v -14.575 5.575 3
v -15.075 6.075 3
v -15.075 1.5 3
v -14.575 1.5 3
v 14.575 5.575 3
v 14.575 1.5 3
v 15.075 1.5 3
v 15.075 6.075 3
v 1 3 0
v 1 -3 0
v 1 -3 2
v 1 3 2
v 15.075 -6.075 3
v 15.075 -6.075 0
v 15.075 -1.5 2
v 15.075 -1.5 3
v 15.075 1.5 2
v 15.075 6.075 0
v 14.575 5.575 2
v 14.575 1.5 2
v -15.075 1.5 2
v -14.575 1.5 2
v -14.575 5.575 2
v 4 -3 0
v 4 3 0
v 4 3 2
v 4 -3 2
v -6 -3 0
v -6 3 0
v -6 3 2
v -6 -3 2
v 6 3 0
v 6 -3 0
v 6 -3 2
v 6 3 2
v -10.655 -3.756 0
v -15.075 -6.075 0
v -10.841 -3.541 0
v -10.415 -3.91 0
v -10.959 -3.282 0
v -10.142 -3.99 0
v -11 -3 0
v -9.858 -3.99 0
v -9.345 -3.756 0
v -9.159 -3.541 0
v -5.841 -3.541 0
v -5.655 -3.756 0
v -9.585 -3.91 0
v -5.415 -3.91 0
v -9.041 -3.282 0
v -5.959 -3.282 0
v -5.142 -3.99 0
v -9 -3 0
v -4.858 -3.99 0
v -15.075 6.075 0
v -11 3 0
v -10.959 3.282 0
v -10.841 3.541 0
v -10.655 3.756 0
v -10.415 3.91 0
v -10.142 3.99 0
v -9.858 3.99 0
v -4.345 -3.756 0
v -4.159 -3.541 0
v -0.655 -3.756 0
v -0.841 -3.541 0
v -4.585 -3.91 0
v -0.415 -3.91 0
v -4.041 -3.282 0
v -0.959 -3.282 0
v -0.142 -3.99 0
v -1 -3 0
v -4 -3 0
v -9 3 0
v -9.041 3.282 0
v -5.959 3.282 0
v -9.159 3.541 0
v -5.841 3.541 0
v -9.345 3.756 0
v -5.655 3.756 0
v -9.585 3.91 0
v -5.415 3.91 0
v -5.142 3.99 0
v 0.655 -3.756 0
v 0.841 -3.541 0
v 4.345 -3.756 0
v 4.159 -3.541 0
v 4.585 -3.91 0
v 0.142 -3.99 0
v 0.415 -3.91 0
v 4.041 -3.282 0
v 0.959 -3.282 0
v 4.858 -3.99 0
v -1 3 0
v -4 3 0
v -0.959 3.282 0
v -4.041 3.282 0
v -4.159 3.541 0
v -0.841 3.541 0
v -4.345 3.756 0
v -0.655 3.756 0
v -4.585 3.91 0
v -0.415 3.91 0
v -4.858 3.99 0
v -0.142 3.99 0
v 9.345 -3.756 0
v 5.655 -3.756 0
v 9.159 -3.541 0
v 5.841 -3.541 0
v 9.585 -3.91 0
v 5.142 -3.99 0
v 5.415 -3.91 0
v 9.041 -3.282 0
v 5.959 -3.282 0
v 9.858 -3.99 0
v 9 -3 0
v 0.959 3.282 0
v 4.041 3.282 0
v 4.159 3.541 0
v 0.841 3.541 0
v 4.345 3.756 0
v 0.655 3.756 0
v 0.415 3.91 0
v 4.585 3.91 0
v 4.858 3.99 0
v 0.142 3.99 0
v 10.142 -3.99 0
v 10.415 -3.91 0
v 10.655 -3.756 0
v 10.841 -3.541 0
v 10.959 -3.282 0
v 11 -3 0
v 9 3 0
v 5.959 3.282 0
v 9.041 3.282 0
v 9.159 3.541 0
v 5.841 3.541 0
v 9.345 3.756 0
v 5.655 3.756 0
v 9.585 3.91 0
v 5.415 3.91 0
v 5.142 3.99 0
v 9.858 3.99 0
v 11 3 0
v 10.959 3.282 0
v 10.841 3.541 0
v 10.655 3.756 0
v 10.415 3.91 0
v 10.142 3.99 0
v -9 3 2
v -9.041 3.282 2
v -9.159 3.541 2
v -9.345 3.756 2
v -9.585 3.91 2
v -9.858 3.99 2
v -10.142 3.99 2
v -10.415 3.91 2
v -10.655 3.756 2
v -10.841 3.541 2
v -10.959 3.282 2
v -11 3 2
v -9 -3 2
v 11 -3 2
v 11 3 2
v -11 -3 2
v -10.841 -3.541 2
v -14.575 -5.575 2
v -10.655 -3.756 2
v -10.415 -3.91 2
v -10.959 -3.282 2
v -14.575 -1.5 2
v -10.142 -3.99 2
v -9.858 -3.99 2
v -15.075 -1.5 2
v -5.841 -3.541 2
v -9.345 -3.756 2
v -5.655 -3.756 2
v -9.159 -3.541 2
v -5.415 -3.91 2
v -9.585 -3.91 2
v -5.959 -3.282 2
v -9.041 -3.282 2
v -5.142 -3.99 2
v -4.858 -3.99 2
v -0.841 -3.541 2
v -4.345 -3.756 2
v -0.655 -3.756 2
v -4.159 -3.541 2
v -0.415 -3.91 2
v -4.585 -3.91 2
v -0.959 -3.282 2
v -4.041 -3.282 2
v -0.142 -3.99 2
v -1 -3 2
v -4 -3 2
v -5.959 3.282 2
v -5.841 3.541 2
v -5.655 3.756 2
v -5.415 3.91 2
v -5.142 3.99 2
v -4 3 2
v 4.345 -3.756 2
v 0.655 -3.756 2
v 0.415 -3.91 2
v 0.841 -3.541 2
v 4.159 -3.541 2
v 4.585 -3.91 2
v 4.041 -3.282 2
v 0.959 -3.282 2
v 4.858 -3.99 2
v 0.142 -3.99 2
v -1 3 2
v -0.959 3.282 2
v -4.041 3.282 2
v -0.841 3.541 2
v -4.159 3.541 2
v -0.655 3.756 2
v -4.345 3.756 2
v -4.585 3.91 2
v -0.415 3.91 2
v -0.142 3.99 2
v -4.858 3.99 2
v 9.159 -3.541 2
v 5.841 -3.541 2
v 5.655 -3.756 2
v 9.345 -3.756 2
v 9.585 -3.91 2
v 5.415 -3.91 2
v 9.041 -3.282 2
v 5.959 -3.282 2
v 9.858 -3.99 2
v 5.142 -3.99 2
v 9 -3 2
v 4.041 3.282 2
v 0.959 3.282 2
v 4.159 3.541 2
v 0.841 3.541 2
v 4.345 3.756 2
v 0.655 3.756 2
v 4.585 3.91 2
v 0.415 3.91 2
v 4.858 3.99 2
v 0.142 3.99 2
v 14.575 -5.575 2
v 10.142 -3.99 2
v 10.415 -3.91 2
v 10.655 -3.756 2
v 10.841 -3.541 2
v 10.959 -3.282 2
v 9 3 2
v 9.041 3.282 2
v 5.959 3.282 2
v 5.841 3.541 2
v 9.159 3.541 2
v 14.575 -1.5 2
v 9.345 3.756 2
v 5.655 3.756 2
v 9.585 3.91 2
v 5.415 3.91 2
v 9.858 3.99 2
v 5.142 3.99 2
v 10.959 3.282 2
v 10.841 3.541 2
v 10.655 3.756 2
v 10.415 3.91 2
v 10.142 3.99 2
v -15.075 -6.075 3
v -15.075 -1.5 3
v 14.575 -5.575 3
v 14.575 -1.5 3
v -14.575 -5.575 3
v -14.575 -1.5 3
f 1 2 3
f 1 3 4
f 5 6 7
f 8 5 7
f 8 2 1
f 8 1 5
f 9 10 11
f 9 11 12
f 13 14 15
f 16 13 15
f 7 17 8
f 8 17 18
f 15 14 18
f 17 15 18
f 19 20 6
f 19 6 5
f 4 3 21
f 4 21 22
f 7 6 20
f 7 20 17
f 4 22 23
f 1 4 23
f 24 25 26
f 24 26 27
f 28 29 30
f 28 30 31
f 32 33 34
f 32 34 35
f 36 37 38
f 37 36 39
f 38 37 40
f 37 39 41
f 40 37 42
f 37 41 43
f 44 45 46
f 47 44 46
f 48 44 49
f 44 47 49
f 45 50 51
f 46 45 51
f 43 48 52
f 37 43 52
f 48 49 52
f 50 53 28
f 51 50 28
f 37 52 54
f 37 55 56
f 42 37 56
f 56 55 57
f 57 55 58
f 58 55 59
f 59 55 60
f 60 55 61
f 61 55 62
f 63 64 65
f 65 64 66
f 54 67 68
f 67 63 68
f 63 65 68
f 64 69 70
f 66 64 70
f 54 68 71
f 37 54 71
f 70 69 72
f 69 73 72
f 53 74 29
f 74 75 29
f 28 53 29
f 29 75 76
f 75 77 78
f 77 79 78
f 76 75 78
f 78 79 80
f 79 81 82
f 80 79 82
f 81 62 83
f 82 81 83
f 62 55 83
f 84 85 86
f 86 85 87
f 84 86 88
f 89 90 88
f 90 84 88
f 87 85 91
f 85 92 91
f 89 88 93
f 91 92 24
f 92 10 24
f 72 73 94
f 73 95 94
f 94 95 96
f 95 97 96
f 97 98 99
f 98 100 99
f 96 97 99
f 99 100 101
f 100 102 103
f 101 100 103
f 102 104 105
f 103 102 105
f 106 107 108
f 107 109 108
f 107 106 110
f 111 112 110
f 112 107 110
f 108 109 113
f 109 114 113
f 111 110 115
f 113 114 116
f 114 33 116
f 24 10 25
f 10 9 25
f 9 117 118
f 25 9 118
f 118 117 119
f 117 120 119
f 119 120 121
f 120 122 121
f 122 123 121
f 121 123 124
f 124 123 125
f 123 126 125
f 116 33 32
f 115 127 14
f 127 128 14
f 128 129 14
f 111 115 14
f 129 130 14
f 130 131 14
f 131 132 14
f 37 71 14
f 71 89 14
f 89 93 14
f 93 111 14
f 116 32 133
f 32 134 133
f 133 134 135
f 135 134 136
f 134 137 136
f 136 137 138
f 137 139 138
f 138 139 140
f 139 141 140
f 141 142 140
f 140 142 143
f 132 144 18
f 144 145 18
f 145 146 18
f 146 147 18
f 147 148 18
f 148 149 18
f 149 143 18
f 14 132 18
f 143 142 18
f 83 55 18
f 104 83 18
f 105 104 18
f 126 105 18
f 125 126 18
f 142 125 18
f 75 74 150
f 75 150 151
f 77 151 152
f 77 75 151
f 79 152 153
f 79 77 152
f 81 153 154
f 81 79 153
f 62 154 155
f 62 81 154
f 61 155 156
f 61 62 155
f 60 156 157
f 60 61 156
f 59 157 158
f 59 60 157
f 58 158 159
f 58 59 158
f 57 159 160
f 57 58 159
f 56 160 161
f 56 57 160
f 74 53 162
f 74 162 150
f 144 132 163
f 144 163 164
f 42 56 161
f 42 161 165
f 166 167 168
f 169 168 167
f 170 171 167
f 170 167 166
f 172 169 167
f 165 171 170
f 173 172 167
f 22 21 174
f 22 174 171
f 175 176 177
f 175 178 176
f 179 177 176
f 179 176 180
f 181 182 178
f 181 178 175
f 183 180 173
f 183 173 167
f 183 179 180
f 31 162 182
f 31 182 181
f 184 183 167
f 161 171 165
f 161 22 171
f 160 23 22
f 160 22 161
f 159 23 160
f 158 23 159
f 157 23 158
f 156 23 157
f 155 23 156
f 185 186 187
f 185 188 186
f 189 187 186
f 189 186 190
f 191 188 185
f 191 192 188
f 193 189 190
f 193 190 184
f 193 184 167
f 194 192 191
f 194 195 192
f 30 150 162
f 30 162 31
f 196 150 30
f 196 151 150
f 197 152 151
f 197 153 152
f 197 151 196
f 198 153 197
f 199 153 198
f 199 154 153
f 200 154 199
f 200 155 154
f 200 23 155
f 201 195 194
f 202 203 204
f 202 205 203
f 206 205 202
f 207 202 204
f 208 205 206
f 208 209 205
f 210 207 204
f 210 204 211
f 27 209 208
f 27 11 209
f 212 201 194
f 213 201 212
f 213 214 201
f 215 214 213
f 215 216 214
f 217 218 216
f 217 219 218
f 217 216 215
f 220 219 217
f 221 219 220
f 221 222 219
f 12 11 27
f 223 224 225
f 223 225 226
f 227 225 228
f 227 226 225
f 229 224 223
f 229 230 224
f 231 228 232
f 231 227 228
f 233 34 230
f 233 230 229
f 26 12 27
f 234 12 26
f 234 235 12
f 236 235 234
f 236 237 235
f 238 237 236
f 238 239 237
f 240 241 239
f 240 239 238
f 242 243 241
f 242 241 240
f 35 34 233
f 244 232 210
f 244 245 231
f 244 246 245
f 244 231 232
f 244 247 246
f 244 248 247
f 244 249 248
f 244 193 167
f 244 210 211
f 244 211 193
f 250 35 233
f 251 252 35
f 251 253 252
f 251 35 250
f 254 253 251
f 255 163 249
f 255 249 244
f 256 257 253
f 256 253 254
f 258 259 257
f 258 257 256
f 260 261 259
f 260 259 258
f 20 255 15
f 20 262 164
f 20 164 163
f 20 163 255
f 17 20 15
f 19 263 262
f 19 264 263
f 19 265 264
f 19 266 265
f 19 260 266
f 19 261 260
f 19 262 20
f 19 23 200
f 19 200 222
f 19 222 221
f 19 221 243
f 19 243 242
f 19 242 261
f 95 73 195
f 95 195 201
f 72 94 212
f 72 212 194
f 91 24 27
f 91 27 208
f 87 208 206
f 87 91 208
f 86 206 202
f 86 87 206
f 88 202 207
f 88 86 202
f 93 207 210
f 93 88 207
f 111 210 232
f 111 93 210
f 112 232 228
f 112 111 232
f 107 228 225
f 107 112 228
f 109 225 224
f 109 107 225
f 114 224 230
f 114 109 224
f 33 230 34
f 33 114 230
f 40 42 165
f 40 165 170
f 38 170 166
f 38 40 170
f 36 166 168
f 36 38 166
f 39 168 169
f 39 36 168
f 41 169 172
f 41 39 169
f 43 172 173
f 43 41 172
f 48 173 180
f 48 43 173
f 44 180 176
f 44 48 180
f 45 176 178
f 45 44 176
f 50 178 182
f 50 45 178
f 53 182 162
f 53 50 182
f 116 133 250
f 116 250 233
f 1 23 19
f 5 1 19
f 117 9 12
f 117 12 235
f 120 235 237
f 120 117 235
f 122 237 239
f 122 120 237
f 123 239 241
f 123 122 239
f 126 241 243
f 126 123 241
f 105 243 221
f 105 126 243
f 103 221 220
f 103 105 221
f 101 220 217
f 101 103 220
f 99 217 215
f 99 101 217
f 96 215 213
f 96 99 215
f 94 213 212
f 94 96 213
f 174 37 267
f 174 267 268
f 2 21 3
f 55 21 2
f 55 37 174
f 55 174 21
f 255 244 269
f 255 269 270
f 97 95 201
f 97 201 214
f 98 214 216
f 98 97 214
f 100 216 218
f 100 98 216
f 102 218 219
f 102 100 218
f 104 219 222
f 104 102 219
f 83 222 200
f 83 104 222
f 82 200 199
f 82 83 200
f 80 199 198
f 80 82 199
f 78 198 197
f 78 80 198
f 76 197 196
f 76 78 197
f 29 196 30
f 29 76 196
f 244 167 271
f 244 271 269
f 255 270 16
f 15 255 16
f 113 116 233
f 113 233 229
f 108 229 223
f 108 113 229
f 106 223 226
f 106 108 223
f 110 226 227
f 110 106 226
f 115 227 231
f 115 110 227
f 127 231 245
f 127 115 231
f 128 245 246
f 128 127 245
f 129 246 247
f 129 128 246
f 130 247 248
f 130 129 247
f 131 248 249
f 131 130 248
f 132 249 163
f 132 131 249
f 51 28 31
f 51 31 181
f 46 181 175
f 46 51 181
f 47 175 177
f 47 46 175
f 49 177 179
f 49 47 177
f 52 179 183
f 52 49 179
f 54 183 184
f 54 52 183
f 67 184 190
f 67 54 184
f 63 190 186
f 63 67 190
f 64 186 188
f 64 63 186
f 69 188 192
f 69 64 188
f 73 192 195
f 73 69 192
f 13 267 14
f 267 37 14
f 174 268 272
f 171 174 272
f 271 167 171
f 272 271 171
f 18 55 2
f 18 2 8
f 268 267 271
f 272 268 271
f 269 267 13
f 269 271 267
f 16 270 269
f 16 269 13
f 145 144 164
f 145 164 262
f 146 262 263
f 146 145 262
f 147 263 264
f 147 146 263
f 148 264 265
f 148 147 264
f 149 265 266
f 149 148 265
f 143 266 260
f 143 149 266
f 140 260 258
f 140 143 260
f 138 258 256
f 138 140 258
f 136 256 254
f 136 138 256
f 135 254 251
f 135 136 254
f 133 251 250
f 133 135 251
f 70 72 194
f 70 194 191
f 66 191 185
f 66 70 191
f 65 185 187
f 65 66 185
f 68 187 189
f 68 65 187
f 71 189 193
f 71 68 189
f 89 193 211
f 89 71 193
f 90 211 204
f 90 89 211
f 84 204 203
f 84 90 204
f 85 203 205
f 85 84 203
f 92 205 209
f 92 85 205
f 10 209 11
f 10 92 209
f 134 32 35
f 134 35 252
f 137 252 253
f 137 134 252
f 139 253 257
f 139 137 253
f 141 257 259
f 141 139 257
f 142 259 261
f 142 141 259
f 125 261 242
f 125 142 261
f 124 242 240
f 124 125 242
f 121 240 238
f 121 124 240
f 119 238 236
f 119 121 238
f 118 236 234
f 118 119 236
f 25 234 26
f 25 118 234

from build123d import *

# Parameters (mm, degrees)
SKETCH1_W           = 30.15
SKETCH1_H           = 12.15
BOSS_EXTRUDE1_DEPTH = 2
SKETCH2_W           = 30.15
SKETCH2_H           = 12.15
SKETCH2_W_2         = 29.15
SKETCH2_H_2         = 11.15
BOSS_EXTRUDE2_DEPTH = 1
CUT_EXTRUDE1_DEPTH  = 2
SKETCH4_W           = 0.5
SKETCH4_H           = 3
CUT_EXTRUDE2_DEPTH  = 1


with BuildPart() as part:
    # Sketch1 → Boss-Extrude1 (new body)
    with BuildSketch(Plane.XY):
        Rectangle(SKETCH1_W, SKETCH1_H)
    extrude(amount=BOSS_EXTRUDE1_DEPTH)

    # Sketch2 → Boss-Extrude2 (add)
    with BuildSketch(Plane.XY.offset(2)):
        Rectangle(SKETCH2_W, SKETCH2_H)
        Rectangle(SKETCH2_W_2, SKETCH2_H_2, mode=Mode.SUBTRACT)
    extrude(amount=BOSS_EXTRUDE2_DEPTH)

    # Sketch3 → Cut-Extrude1 (cut)
    with BuildSketch(Plane(origin=(0, 0, 0), x_dir=(-1, 0, 0), z_dir=(0, 0, -1))):
        with BuildLine():
            Line((-1, -3), (-1, 3))
            ThreePointArc((-1, 3), (0, 4), (1, 3))
            Line((1, 3), (1, -3))
            ThreePointArc((1, -3), (0, -4), (-1, -3))
        make_face()
        with BuildLine():
            Line((-6, -3), (-6, 3))
            ThreePointArc((-6, 3), (-5, 4), (-4, 3))
            Line((-4, 3), (-4, -3))
            ThreePointArc((-4, -3), (-5, -4), (-6, -3))
        make_face()
        with BuildLine():
            Line((-11, -3), (-11, 3))
            ThreePointArc((-11, 3), (-10, 4), (-9, 3))
            Line((-9, 3), (-9, -3))
            ThreePointArc((-9, -3), (-10, -4), (-11, -3))
        make_face()
        with BuildLine():
            Line((4, -3), (4, 3))
            ThreePointArc((4, 3), (5, 4), (6, 3))
            Line((6, 3), (6, -3))
            ThreePointArc((6, -3), (5, -4), (4, -3))
        make_face()
        with BuildLine():
            Line((9, -3), (9, 3))
            ThreePointArc((9, 3), (10, 4), (11, 3))
            Line((11, 3), (11, -3))
            ThreePointArc((11, -3), (10, -4), (9, -3))
        make_face()
    extrude(amount=-CUT_EXTRUDE1_DEPTH, mode=Mode.SUBTRACT)

    # Sketch4 → Cut-Extrude2 (cut)
    with BuildSketch(Plane.XY.offset(3)):
        with Locations((-14.825, 0)):
            Rectangle(SKETCH4_W, SKETCH4_H)
        with Locations((14.825, 0)):
            Rectangle(SKETCH4_W, SKETCH4_H)
    extrude(amount=-CUT_EXTRUDE2_DEPTH, mode=Mode.SUBTRACT)


solid = part.part
